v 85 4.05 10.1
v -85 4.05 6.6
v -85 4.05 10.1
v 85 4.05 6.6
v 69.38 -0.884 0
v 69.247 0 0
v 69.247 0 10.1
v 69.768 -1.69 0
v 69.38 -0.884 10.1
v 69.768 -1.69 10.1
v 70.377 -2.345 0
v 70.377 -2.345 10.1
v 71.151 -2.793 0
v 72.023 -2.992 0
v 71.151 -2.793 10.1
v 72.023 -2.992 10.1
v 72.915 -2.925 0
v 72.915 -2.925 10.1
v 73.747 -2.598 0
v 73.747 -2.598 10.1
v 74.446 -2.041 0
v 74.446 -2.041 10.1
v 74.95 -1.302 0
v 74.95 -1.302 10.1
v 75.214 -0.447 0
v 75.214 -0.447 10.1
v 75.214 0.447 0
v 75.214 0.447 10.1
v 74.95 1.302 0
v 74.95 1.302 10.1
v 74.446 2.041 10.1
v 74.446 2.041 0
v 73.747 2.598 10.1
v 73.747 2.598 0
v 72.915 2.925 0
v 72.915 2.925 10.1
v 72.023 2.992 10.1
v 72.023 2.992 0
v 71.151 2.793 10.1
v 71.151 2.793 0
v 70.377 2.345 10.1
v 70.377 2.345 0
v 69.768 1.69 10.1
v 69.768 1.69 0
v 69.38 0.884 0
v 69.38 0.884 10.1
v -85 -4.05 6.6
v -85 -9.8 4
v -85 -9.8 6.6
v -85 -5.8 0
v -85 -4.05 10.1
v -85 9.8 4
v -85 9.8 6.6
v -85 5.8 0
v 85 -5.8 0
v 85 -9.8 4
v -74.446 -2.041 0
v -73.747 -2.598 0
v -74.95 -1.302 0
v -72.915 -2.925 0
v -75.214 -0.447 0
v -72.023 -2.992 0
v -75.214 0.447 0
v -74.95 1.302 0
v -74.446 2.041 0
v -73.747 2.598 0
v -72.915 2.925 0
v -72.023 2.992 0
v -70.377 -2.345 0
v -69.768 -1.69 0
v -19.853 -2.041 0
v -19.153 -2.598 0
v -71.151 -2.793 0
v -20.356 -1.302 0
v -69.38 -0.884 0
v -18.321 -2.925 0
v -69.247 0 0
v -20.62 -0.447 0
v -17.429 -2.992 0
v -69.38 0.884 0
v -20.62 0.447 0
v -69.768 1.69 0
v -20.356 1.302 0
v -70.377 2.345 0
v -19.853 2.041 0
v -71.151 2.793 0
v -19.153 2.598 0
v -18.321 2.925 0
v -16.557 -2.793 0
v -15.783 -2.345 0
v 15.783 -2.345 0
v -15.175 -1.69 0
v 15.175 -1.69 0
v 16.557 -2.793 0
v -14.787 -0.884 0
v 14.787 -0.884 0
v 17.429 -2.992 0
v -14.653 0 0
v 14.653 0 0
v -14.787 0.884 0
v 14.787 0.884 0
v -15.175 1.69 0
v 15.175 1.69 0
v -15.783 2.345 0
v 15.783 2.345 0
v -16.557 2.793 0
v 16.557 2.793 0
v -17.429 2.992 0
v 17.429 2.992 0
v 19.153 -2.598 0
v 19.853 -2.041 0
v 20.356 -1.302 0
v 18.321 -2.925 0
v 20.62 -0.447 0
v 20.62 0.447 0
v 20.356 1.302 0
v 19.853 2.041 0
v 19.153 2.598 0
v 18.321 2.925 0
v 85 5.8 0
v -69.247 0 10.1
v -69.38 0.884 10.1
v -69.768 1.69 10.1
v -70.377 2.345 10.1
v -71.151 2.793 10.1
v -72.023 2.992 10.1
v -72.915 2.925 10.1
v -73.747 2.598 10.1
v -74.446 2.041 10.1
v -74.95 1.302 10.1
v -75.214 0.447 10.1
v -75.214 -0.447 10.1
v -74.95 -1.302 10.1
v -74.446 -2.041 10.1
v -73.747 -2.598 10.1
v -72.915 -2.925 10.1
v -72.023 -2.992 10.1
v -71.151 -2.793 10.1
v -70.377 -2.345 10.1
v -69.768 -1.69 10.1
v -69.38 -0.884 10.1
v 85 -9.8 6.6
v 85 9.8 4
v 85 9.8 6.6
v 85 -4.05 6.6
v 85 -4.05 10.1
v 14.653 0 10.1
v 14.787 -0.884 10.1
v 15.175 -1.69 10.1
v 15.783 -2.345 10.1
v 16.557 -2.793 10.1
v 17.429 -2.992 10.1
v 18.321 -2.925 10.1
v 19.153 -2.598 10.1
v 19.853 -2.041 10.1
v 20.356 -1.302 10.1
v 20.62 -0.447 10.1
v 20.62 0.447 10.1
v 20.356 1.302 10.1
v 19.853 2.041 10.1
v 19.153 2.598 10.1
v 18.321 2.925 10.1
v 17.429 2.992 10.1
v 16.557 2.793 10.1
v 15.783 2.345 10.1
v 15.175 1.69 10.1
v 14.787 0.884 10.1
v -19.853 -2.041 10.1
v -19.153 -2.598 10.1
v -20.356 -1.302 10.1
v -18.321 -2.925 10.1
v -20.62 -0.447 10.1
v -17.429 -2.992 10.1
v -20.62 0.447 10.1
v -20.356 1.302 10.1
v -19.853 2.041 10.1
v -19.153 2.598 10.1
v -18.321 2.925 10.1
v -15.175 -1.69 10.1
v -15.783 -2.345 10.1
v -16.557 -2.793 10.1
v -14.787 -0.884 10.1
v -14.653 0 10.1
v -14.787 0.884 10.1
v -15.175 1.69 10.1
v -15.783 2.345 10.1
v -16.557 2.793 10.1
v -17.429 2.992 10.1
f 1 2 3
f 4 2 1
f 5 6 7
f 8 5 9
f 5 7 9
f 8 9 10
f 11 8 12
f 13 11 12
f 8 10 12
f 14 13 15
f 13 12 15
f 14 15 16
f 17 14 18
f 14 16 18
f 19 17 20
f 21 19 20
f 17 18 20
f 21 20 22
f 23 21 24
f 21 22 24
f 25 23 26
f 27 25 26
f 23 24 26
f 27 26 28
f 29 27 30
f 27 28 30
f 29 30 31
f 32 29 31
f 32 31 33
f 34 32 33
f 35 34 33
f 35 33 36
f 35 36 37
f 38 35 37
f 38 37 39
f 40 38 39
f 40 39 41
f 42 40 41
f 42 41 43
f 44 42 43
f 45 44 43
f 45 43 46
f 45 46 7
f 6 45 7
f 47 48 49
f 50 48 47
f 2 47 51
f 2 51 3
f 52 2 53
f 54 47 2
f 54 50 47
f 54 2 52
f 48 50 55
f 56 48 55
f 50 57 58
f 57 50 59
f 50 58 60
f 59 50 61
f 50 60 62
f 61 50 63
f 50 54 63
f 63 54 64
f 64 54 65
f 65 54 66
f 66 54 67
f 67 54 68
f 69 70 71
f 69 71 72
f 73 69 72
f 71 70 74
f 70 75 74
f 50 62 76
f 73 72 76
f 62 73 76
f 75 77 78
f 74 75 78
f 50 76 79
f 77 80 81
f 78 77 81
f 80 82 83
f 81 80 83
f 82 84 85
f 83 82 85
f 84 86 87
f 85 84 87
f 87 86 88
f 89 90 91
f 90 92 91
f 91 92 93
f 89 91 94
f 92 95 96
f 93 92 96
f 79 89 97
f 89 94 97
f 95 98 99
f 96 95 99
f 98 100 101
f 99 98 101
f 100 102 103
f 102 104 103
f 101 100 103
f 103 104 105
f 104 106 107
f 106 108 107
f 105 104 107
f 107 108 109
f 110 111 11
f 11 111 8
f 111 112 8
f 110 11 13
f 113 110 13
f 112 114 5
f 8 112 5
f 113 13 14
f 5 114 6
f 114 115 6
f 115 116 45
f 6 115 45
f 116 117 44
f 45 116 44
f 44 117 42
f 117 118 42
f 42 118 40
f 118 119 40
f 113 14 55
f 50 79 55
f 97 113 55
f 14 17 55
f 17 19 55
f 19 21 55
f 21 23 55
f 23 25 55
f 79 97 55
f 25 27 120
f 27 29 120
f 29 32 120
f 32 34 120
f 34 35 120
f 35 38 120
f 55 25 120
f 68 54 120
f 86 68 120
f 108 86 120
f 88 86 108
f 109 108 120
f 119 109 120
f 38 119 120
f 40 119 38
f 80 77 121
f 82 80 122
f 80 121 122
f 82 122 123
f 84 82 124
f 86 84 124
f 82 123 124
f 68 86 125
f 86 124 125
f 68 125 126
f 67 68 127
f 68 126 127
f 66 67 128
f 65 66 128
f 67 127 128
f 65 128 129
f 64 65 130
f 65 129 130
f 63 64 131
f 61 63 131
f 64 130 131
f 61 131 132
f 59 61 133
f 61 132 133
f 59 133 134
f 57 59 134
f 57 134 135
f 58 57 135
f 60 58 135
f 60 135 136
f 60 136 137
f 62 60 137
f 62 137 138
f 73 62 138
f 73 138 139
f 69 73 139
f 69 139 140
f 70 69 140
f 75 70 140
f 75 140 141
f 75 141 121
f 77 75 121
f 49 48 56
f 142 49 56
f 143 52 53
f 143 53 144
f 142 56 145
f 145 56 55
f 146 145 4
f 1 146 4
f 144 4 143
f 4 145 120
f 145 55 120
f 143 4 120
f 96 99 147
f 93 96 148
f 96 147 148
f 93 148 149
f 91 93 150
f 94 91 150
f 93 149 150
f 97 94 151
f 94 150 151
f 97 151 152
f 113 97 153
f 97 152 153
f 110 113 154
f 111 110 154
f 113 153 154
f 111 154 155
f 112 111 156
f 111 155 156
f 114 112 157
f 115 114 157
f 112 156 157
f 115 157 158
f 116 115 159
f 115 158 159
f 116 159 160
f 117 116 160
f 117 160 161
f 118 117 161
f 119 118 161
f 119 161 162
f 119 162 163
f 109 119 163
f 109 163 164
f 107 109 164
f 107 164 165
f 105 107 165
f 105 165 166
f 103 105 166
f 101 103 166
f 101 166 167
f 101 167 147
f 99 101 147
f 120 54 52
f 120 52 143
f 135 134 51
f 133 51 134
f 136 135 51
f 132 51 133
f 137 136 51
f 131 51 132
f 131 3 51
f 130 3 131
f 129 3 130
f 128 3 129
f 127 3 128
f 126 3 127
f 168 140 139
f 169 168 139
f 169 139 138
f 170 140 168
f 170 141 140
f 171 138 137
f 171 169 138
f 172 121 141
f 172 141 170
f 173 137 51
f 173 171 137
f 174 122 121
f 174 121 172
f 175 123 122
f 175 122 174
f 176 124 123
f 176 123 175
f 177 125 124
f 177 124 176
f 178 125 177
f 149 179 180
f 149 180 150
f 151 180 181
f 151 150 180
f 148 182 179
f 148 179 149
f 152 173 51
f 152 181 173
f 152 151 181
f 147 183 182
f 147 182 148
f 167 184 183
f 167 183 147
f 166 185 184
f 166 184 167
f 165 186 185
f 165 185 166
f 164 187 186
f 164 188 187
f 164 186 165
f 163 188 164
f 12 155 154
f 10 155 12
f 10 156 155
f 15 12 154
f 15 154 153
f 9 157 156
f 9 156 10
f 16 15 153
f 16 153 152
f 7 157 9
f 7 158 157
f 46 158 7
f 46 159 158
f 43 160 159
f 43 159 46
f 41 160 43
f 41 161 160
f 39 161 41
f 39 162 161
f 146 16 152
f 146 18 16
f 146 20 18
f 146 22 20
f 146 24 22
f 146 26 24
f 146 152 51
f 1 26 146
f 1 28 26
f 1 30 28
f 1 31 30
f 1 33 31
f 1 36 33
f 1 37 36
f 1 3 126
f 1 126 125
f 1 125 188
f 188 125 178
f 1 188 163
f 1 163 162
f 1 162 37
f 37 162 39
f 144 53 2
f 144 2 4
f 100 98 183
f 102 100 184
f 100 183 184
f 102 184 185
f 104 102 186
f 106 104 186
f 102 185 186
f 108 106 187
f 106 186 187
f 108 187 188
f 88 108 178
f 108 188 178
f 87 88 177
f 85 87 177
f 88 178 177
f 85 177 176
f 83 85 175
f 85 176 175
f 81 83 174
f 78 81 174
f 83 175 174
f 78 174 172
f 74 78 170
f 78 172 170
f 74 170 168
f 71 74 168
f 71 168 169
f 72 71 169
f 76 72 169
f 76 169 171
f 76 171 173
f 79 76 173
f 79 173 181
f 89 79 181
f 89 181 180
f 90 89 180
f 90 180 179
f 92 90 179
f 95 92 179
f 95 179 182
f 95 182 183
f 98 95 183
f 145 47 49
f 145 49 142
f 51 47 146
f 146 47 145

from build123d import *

# Parameters (mm, degrees)
SKETCH_1_W          = 170
SKETCH_1_H          = 19.6
EXTRUDE_1_DEPTH     = 6.6
SKETCH_2_W          = 170
SKETCH_2_H          = 8.1
EXTRUDE_2_DEPTH     = 3.5
SKETCH_3_R          = 3
CUT_EXTRUDE_1_DEPTH = 87.157123907
CHAMFER_1_SIZE      = 4


with BuildPart() as part:
    # 草图1 → 凸台-拉伸1 (new body)
    with BuildSketch(Plane.XY):
        Rectangle(SKETCH_1_W, SKETCH_1_H)
    extrude(amount=EXTRUDE_1_DEPTH)

    # 草图2 → 凸台-拉伸2 (add)
    with BuildSketch(Plane.XY.offset(6.6)):
        Rectangle(SKETCH_2_W, SKETCH_2_H)
    extrude(amount=EXTRUDE_2_DEPTH)

    # 草图3 → 切除-拉伸1 (cut, through all)
    with BuildSketch(Plane.XY.offset(10.1)):
        with Locations((-72.247114829, 0)):
            Circle(SKETCH_3_R)
        with Locations((-17.653434016, 0)):
            Circle(SKETCH_3_R)
        with Locations(Location((17.653434016, 0, 0), (0, 0, 180))):
            Circle(SKETCH_3_R)
        with Locations(Location((72.247114829, 0, 0), (0, 0, 180))):
            Circle(SKETCH_3_R)
    extrude(amount=-CUT_EXTRUDE_1_DEPTH, mode=Mode.SUBTRACT)

    # 倒角1
    chamfer_1_edges = [part.edges().sort_by_distance(p)[0] for p in [
        (0, -9.8, 0),
        (0, 9.8, 0),
    ]]
    chamfer(chamfer_1_edges, length=CHAMFER_1_SIZE)


solid = part.part
